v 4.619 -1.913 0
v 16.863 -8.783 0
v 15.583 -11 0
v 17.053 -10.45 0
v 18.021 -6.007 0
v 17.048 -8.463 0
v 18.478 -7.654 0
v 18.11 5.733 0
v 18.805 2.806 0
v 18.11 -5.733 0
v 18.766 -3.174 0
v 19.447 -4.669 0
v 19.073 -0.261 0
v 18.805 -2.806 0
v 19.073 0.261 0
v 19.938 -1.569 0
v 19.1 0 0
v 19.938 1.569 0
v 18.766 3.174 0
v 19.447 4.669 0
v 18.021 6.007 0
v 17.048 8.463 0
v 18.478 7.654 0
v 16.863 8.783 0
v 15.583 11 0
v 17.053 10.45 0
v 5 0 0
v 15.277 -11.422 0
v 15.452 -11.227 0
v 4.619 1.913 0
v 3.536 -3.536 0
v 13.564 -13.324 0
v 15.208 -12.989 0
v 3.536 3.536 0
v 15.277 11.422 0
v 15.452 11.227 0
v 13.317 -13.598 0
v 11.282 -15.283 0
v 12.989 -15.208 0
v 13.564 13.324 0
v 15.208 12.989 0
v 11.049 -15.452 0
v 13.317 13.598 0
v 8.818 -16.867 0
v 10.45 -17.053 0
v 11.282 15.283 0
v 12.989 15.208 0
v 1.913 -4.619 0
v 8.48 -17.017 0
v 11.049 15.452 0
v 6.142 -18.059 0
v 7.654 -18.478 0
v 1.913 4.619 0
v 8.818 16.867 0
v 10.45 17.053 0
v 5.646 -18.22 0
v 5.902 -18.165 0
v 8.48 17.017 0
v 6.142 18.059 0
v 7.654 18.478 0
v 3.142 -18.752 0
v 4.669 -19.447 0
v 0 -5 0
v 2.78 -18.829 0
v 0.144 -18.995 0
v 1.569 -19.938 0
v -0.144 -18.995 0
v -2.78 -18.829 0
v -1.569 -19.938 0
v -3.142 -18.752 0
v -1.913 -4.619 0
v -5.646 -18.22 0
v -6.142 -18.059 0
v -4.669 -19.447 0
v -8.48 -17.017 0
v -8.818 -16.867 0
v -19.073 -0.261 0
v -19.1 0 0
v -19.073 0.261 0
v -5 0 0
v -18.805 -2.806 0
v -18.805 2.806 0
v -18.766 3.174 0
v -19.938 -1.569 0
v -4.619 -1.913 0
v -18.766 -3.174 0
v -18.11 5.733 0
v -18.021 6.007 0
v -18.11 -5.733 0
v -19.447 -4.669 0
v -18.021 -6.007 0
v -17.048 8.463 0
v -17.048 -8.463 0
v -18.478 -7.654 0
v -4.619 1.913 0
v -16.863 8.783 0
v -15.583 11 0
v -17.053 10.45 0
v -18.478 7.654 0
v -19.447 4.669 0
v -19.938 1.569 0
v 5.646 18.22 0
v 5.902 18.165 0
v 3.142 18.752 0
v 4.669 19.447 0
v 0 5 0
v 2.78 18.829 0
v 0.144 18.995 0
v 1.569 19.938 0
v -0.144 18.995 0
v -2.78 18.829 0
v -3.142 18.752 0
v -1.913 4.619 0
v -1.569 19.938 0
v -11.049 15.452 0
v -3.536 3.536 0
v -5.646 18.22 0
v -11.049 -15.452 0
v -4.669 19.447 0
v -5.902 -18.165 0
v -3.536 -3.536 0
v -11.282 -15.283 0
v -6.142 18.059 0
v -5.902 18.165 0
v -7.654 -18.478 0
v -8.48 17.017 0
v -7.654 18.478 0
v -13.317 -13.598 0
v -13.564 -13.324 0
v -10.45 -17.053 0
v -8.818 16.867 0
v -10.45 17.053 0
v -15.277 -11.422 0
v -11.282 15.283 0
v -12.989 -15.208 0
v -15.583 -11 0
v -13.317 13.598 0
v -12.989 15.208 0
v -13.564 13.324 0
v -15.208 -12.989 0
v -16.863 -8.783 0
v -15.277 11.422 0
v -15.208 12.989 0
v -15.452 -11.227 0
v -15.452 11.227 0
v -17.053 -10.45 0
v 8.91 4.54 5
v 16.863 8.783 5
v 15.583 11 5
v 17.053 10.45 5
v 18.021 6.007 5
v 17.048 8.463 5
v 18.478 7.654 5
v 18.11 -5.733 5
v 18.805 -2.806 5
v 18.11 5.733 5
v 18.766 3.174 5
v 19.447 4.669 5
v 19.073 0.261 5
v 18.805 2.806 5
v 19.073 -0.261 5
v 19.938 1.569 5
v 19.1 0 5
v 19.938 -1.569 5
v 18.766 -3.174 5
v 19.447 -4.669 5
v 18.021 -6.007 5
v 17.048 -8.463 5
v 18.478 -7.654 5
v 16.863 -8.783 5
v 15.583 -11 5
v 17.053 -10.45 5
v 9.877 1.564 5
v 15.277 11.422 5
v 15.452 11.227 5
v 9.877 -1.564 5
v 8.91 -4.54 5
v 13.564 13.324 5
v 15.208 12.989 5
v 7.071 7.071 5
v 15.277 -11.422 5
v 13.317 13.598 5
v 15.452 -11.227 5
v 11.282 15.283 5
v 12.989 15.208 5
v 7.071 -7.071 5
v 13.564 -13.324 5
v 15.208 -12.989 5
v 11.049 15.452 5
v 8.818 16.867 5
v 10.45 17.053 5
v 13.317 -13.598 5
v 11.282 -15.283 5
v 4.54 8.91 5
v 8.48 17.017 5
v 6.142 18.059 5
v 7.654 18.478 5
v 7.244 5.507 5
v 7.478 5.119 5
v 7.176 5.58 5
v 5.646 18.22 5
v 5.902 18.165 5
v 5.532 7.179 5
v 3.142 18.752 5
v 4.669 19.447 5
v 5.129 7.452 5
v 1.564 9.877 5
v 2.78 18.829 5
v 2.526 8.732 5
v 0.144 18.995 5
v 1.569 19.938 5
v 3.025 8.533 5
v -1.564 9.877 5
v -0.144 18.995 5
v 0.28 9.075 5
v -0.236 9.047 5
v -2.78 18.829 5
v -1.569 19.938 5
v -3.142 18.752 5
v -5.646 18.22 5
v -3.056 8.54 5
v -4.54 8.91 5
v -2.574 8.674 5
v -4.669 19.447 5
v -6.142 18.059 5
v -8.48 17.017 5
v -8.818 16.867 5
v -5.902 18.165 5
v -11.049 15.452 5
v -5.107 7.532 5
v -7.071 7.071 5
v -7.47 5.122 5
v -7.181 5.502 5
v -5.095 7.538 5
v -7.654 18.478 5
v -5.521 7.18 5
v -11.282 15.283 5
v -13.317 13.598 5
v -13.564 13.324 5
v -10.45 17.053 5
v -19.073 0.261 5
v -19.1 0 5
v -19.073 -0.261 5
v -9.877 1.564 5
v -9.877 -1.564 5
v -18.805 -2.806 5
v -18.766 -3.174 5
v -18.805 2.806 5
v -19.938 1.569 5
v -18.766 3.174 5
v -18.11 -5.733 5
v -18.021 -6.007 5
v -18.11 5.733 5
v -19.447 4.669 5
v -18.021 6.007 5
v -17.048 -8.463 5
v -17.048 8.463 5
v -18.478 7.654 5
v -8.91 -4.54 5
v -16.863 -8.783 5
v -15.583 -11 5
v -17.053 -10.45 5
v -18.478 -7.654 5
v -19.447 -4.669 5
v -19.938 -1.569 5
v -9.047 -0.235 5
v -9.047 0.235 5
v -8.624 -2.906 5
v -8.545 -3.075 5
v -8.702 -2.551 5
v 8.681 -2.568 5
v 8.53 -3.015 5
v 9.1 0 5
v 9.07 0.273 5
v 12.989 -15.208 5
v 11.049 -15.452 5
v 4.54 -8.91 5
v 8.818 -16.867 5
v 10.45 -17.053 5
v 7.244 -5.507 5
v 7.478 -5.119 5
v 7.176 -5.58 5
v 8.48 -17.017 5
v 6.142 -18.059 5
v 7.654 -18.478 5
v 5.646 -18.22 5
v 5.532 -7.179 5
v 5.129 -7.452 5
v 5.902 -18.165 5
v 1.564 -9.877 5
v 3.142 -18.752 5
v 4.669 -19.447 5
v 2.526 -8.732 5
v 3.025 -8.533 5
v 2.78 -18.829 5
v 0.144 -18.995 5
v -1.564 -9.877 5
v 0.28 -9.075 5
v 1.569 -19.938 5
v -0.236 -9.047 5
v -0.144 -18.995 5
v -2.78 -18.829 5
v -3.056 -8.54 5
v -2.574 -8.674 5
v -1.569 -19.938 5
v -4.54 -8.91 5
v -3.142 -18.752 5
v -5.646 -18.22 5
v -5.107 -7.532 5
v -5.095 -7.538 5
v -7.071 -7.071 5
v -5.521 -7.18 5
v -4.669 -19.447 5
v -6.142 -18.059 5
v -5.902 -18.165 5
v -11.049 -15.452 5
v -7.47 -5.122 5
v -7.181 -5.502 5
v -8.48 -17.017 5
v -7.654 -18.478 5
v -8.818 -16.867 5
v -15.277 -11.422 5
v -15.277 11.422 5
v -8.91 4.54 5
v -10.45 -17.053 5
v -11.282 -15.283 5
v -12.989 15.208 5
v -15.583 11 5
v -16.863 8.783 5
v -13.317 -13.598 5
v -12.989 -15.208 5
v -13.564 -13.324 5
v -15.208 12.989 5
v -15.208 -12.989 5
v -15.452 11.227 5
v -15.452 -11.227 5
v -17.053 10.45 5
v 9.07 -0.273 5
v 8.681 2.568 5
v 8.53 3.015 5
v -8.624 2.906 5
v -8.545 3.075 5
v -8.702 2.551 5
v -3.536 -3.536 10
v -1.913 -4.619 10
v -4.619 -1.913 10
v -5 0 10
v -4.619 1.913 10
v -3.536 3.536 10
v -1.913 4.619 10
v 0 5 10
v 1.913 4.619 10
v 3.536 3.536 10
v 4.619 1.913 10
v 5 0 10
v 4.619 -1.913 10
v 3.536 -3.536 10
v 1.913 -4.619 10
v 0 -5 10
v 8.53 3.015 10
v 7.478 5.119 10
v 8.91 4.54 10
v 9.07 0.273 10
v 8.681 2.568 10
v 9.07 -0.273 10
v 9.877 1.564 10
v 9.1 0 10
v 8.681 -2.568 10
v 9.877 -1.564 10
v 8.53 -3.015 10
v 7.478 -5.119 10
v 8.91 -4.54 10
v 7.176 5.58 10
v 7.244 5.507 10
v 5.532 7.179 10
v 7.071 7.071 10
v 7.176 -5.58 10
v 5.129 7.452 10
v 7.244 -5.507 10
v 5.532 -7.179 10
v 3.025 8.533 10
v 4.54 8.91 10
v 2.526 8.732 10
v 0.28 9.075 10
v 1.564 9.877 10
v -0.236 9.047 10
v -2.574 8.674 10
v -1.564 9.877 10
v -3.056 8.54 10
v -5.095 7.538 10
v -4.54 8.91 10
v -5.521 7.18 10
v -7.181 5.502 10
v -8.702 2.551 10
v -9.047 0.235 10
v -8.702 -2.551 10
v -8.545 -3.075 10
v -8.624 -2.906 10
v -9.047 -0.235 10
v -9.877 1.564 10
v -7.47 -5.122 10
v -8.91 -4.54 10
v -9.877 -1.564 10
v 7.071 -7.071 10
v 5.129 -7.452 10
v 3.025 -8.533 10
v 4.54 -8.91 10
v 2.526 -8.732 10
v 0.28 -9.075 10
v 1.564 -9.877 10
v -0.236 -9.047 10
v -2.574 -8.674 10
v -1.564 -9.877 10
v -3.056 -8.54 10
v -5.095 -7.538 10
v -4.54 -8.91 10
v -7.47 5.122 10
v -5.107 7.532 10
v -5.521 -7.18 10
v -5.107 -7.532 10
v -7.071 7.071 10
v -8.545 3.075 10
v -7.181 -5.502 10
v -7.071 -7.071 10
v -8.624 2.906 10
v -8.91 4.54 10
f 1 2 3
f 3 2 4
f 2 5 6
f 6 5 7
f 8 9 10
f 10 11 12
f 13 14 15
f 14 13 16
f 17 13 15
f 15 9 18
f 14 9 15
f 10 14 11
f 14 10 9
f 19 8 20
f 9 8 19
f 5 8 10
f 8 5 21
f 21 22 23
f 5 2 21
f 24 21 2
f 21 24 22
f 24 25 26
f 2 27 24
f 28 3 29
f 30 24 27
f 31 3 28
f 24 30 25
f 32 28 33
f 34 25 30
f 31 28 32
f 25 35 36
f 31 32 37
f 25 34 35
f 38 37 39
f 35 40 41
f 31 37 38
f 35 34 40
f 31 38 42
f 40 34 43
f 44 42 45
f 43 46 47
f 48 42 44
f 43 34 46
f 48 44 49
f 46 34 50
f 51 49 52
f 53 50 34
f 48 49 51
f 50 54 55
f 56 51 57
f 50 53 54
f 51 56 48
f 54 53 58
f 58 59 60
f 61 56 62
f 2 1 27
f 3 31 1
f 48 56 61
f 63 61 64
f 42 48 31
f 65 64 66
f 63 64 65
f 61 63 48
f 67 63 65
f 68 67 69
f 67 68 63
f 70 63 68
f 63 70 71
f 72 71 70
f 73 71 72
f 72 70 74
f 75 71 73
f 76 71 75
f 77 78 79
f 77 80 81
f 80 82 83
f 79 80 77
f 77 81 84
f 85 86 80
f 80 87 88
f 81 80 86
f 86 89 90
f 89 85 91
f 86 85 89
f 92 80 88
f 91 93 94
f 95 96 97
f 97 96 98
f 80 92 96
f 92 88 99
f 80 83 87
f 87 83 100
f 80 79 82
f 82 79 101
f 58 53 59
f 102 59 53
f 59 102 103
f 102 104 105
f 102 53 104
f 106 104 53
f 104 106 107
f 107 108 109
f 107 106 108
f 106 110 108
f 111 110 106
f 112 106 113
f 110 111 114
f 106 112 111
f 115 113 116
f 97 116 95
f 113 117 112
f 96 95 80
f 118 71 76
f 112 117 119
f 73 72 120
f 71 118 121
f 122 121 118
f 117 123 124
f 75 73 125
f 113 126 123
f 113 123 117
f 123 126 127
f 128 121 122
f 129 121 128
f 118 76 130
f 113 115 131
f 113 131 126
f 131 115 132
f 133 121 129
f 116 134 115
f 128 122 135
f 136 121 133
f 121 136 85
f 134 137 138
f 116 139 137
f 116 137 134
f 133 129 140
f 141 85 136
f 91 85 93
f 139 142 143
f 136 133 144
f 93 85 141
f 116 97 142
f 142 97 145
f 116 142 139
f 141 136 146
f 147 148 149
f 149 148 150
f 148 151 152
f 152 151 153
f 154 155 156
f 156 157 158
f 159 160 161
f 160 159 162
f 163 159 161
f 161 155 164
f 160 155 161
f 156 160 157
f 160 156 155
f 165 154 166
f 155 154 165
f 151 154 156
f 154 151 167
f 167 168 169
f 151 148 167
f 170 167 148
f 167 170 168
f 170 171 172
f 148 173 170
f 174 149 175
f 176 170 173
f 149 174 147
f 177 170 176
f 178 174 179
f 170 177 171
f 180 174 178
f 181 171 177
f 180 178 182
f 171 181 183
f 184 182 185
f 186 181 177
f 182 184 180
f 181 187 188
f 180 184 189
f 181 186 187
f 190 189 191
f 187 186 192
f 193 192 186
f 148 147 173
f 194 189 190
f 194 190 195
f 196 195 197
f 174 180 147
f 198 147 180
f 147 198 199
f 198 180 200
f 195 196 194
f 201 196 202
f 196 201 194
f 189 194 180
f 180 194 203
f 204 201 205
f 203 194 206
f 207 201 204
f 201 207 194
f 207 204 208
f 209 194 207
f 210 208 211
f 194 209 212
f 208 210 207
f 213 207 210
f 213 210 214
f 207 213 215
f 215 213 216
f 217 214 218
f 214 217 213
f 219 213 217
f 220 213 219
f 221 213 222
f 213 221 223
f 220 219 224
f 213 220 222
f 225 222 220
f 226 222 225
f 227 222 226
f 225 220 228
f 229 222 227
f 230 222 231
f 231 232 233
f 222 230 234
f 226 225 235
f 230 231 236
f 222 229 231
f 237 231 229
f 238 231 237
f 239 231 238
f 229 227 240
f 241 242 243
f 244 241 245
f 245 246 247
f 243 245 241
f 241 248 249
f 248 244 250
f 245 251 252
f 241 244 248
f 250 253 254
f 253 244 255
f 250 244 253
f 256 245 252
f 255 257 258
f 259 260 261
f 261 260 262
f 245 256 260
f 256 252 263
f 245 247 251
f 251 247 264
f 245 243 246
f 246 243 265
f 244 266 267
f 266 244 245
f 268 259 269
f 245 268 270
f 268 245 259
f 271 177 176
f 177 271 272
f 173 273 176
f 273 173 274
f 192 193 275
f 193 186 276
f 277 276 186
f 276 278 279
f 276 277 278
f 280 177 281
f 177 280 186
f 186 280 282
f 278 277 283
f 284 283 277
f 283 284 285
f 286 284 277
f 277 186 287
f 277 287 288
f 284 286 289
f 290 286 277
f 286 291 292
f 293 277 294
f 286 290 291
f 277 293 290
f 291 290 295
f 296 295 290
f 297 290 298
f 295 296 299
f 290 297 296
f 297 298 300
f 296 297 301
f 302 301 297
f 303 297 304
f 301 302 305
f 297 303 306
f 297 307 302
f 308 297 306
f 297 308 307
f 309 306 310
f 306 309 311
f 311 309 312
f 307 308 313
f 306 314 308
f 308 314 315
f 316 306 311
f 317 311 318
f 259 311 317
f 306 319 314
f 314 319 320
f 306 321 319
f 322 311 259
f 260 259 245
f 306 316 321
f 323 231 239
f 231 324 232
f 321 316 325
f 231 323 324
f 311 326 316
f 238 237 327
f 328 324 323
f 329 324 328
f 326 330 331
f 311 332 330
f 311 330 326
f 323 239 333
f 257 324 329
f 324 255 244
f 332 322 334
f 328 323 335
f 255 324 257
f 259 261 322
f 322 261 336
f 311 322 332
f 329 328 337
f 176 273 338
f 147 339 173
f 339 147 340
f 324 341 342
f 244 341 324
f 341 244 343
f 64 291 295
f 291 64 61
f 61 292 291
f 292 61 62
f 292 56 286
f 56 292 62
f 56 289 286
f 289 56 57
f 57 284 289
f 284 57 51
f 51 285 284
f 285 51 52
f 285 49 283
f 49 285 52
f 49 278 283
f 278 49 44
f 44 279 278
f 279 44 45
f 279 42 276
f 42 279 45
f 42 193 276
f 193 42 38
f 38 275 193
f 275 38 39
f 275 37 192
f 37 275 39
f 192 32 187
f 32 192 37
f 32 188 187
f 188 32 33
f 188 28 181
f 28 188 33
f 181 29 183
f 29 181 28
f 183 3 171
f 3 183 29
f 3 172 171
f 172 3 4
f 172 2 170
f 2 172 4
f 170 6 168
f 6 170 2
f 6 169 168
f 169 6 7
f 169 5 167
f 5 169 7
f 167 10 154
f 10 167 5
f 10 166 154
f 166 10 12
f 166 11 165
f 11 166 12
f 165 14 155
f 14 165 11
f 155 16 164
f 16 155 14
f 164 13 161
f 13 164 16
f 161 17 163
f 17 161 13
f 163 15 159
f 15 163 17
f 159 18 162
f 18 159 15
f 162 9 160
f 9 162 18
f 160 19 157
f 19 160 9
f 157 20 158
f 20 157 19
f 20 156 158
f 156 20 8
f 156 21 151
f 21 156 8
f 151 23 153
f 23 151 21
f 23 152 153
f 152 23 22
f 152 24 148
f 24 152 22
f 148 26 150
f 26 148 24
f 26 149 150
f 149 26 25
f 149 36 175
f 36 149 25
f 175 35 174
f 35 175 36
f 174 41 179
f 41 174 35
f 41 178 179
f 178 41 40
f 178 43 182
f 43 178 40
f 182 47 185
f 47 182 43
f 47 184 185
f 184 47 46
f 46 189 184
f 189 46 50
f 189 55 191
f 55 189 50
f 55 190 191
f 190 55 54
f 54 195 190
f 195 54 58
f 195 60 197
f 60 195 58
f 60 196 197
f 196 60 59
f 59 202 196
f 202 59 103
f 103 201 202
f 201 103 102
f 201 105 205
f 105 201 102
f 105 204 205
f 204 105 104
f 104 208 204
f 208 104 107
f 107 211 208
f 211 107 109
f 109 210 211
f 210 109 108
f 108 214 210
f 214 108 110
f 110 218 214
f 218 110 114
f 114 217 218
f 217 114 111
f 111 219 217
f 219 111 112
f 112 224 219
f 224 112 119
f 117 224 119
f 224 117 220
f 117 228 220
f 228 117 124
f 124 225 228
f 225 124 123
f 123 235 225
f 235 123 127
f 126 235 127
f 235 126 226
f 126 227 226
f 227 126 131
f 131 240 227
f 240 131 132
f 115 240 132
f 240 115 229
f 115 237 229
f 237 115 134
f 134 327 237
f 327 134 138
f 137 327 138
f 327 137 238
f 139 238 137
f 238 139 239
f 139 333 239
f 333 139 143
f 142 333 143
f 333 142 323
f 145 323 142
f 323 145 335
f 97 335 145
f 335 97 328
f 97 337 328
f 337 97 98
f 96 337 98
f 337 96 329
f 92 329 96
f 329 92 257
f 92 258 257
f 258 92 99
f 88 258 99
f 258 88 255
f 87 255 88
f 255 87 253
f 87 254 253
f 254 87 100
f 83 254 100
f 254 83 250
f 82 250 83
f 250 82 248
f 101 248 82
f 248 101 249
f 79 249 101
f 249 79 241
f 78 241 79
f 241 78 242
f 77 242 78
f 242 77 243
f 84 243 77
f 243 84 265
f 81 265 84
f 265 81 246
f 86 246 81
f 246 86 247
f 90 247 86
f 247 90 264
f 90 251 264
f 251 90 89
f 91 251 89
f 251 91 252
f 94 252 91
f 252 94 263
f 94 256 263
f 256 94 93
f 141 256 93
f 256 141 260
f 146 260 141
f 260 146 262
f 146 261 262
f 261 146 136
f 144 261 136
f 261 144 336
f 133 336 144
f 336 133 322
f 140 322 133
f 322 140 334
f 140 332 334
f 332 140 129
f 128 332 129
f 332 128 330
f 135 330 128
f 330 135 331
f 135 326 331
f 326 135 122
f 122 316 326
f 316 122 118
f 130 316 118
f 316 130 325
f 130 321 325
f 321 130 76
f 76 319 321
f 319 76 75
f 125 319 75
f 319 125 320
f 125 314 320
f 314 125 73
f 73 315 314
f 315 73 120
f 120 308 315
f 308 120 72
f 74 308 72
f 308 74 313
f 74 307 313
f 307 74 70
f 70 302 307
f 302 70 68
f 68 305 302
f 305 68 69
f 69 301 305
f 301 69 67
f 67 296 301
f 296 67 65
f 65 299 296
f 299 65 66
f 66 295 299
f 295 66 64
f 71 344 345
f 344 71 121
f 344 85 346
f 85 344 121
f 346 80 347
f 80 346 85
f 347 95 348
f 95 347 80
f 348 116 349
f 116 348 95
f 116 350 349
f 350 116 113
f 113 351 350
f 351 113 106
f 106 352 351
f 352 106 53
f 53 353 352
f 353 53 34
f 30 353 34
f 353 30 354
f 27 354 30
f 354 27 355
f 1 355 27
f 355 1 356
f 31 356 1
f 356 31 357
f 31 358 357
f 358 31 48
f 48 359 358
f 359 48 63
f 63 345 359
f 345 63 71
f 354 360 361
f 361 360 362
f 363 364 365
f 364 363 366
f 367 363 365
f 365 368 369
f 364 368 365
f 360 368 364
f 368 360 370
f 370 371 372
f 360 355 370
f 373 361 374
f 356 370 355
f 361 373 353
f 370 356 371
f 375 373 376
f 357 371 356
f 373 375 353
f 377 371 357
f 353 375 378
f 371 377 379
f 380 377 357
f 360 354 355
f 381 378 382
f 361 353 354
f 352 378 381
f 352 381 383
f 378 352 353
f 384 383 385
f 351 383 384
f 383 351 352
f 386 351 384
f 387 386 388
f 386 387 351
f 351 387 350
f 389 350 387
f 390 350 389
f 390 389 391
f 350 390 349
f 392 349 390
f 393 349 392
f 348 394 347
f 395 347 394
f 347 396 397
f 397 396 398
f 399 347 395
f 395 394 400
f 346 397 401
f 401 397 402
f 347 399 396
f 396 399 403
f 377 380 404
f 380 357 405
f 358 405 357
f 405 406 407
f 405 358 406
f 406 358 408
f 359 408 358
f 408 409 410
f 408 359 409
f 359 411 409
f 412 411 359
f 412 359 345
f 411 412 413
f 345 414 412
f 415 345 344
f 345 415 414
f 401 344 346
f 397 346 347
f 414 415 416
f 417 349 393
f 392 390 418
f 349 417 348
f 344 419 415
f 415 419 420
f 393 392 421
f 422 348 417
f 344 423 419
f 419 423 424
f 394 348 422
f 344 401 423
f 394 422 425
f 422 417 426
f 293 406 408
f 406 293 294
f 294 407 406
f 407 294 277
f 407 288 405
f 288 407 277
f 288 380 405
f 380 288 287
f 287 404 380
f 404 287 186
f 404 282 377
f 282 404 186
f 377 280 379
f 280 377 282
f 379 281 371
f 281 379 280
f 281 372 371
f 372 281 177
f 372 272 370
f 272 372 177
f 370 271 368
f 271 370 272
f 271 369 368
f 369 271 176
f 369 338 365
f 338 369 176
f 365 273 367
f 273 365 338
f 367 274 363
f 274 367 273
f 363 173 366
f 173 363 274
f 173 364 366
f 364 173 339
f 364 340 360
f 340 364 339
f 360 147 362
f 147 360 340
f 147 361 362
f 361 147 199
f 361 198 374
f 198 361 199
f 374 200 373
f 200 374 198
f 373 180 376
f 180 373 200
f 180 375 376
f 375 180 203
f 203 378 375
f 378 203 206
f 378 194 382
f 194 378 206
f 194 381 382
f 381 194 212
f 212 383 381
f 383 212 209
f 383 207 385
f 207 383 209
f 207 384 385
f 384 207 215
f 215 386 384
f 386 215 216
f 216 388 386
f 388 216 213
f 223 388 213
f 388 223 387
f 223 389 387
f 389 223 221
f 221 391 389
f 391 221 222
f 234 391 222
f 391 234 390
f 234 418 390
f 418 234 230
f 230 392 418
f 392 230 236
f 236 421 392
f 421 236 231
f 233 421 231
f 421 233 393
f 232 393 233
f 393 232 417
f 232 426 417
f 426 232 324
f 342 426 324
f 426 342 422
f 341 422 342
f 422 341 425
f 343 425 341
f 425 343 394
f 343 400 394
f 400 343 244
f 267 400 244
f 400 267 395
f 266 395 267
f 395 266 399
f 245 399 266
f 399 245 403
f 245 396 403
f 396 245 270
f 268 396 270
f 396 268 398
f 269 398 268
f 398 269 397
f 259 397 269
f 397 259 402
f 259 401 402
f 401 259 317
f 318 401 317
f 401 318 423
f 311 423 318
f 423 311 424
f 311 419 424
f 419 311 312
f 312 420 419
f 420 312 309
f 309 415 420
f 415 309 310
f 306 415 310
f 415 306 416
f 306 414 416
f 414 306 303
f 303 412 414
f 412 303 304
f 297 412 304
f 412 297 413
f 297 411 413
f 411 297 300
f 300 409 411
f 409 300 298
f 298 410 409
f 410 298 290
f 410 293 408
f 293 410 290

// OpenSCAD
//CUSTOMIZER VARIABLES

//radius of the bottom gear (to edge of teeth)
_Radius_1 = 20;//[6:50]
//radius of the center hole
_Radius_center = 5;//[0:20]
// number of teeth on the bottom gear
_Teeth_1 = 40;//[6:60]
//height of the bottom gear
_Height_1 = 5;//[1:10]
//radius of the top gear (to edge of teeth)
_Radius_2 = 10;//[6:50]
//number of teeth on the top gear
_Teeth_2 = 20;//[6:60]
//height of the top gear
_Height_2 = 5;//[1:10]

//CUSTOMIZER VARIABLES END

r = _Radius_1*1;
rc = _Radius_center * 1;
t = _Teeth_1*1;
h = _Height_1*1;

r2 = _Radius_2*1;
t2 = _Teeth_2*1;
h2 = _Height_2*1;

 
module gear()
{
  q = 360/t;
  w = q/2;
difference()
{
  circle(r-.9);
  circle(rc);
}
  for(i=[0:t])
  {
    polygon([[sin(i*q)*(r-1.1),cos(i*q)*(r-1.1)],[sin((i*q)+w)*(r),cos((i*q)+w)*(r)],[sin((i+1)*q)*(r-1.1),cos((i+1)*q)*(r-1.1)]]);
  }
}

module gear2()
{
 
  q2 = 360/t2;
  w2 = q2/2;
difference()
{
  circle(r2-.9);
  circle(rc);
}

  for(i=[0:t2])
  {
    polygon([[sin(i*q2)*(r2-1.1),cos(i*q2)*(r2-1.1)],[sin((i*q2)+w2)*(r2),cos((i*q2)+w2)*(r2)],[sin((i+1)*q2)*(r2-1.1),cos((i+1)*q2)*(r2-1.1)]]);
  }
}
module final()
{

union(){
 // cylinder((h+h2),rc+1,rc+1);
  linear_extrude(height=h)
    gear(); 

  translate([0,0,h])
  linear_extrude(height=h2)
    gear2(); 
  }

}

//difference(){
final();
//cylinder((h+h2),rc,rc);
//}
